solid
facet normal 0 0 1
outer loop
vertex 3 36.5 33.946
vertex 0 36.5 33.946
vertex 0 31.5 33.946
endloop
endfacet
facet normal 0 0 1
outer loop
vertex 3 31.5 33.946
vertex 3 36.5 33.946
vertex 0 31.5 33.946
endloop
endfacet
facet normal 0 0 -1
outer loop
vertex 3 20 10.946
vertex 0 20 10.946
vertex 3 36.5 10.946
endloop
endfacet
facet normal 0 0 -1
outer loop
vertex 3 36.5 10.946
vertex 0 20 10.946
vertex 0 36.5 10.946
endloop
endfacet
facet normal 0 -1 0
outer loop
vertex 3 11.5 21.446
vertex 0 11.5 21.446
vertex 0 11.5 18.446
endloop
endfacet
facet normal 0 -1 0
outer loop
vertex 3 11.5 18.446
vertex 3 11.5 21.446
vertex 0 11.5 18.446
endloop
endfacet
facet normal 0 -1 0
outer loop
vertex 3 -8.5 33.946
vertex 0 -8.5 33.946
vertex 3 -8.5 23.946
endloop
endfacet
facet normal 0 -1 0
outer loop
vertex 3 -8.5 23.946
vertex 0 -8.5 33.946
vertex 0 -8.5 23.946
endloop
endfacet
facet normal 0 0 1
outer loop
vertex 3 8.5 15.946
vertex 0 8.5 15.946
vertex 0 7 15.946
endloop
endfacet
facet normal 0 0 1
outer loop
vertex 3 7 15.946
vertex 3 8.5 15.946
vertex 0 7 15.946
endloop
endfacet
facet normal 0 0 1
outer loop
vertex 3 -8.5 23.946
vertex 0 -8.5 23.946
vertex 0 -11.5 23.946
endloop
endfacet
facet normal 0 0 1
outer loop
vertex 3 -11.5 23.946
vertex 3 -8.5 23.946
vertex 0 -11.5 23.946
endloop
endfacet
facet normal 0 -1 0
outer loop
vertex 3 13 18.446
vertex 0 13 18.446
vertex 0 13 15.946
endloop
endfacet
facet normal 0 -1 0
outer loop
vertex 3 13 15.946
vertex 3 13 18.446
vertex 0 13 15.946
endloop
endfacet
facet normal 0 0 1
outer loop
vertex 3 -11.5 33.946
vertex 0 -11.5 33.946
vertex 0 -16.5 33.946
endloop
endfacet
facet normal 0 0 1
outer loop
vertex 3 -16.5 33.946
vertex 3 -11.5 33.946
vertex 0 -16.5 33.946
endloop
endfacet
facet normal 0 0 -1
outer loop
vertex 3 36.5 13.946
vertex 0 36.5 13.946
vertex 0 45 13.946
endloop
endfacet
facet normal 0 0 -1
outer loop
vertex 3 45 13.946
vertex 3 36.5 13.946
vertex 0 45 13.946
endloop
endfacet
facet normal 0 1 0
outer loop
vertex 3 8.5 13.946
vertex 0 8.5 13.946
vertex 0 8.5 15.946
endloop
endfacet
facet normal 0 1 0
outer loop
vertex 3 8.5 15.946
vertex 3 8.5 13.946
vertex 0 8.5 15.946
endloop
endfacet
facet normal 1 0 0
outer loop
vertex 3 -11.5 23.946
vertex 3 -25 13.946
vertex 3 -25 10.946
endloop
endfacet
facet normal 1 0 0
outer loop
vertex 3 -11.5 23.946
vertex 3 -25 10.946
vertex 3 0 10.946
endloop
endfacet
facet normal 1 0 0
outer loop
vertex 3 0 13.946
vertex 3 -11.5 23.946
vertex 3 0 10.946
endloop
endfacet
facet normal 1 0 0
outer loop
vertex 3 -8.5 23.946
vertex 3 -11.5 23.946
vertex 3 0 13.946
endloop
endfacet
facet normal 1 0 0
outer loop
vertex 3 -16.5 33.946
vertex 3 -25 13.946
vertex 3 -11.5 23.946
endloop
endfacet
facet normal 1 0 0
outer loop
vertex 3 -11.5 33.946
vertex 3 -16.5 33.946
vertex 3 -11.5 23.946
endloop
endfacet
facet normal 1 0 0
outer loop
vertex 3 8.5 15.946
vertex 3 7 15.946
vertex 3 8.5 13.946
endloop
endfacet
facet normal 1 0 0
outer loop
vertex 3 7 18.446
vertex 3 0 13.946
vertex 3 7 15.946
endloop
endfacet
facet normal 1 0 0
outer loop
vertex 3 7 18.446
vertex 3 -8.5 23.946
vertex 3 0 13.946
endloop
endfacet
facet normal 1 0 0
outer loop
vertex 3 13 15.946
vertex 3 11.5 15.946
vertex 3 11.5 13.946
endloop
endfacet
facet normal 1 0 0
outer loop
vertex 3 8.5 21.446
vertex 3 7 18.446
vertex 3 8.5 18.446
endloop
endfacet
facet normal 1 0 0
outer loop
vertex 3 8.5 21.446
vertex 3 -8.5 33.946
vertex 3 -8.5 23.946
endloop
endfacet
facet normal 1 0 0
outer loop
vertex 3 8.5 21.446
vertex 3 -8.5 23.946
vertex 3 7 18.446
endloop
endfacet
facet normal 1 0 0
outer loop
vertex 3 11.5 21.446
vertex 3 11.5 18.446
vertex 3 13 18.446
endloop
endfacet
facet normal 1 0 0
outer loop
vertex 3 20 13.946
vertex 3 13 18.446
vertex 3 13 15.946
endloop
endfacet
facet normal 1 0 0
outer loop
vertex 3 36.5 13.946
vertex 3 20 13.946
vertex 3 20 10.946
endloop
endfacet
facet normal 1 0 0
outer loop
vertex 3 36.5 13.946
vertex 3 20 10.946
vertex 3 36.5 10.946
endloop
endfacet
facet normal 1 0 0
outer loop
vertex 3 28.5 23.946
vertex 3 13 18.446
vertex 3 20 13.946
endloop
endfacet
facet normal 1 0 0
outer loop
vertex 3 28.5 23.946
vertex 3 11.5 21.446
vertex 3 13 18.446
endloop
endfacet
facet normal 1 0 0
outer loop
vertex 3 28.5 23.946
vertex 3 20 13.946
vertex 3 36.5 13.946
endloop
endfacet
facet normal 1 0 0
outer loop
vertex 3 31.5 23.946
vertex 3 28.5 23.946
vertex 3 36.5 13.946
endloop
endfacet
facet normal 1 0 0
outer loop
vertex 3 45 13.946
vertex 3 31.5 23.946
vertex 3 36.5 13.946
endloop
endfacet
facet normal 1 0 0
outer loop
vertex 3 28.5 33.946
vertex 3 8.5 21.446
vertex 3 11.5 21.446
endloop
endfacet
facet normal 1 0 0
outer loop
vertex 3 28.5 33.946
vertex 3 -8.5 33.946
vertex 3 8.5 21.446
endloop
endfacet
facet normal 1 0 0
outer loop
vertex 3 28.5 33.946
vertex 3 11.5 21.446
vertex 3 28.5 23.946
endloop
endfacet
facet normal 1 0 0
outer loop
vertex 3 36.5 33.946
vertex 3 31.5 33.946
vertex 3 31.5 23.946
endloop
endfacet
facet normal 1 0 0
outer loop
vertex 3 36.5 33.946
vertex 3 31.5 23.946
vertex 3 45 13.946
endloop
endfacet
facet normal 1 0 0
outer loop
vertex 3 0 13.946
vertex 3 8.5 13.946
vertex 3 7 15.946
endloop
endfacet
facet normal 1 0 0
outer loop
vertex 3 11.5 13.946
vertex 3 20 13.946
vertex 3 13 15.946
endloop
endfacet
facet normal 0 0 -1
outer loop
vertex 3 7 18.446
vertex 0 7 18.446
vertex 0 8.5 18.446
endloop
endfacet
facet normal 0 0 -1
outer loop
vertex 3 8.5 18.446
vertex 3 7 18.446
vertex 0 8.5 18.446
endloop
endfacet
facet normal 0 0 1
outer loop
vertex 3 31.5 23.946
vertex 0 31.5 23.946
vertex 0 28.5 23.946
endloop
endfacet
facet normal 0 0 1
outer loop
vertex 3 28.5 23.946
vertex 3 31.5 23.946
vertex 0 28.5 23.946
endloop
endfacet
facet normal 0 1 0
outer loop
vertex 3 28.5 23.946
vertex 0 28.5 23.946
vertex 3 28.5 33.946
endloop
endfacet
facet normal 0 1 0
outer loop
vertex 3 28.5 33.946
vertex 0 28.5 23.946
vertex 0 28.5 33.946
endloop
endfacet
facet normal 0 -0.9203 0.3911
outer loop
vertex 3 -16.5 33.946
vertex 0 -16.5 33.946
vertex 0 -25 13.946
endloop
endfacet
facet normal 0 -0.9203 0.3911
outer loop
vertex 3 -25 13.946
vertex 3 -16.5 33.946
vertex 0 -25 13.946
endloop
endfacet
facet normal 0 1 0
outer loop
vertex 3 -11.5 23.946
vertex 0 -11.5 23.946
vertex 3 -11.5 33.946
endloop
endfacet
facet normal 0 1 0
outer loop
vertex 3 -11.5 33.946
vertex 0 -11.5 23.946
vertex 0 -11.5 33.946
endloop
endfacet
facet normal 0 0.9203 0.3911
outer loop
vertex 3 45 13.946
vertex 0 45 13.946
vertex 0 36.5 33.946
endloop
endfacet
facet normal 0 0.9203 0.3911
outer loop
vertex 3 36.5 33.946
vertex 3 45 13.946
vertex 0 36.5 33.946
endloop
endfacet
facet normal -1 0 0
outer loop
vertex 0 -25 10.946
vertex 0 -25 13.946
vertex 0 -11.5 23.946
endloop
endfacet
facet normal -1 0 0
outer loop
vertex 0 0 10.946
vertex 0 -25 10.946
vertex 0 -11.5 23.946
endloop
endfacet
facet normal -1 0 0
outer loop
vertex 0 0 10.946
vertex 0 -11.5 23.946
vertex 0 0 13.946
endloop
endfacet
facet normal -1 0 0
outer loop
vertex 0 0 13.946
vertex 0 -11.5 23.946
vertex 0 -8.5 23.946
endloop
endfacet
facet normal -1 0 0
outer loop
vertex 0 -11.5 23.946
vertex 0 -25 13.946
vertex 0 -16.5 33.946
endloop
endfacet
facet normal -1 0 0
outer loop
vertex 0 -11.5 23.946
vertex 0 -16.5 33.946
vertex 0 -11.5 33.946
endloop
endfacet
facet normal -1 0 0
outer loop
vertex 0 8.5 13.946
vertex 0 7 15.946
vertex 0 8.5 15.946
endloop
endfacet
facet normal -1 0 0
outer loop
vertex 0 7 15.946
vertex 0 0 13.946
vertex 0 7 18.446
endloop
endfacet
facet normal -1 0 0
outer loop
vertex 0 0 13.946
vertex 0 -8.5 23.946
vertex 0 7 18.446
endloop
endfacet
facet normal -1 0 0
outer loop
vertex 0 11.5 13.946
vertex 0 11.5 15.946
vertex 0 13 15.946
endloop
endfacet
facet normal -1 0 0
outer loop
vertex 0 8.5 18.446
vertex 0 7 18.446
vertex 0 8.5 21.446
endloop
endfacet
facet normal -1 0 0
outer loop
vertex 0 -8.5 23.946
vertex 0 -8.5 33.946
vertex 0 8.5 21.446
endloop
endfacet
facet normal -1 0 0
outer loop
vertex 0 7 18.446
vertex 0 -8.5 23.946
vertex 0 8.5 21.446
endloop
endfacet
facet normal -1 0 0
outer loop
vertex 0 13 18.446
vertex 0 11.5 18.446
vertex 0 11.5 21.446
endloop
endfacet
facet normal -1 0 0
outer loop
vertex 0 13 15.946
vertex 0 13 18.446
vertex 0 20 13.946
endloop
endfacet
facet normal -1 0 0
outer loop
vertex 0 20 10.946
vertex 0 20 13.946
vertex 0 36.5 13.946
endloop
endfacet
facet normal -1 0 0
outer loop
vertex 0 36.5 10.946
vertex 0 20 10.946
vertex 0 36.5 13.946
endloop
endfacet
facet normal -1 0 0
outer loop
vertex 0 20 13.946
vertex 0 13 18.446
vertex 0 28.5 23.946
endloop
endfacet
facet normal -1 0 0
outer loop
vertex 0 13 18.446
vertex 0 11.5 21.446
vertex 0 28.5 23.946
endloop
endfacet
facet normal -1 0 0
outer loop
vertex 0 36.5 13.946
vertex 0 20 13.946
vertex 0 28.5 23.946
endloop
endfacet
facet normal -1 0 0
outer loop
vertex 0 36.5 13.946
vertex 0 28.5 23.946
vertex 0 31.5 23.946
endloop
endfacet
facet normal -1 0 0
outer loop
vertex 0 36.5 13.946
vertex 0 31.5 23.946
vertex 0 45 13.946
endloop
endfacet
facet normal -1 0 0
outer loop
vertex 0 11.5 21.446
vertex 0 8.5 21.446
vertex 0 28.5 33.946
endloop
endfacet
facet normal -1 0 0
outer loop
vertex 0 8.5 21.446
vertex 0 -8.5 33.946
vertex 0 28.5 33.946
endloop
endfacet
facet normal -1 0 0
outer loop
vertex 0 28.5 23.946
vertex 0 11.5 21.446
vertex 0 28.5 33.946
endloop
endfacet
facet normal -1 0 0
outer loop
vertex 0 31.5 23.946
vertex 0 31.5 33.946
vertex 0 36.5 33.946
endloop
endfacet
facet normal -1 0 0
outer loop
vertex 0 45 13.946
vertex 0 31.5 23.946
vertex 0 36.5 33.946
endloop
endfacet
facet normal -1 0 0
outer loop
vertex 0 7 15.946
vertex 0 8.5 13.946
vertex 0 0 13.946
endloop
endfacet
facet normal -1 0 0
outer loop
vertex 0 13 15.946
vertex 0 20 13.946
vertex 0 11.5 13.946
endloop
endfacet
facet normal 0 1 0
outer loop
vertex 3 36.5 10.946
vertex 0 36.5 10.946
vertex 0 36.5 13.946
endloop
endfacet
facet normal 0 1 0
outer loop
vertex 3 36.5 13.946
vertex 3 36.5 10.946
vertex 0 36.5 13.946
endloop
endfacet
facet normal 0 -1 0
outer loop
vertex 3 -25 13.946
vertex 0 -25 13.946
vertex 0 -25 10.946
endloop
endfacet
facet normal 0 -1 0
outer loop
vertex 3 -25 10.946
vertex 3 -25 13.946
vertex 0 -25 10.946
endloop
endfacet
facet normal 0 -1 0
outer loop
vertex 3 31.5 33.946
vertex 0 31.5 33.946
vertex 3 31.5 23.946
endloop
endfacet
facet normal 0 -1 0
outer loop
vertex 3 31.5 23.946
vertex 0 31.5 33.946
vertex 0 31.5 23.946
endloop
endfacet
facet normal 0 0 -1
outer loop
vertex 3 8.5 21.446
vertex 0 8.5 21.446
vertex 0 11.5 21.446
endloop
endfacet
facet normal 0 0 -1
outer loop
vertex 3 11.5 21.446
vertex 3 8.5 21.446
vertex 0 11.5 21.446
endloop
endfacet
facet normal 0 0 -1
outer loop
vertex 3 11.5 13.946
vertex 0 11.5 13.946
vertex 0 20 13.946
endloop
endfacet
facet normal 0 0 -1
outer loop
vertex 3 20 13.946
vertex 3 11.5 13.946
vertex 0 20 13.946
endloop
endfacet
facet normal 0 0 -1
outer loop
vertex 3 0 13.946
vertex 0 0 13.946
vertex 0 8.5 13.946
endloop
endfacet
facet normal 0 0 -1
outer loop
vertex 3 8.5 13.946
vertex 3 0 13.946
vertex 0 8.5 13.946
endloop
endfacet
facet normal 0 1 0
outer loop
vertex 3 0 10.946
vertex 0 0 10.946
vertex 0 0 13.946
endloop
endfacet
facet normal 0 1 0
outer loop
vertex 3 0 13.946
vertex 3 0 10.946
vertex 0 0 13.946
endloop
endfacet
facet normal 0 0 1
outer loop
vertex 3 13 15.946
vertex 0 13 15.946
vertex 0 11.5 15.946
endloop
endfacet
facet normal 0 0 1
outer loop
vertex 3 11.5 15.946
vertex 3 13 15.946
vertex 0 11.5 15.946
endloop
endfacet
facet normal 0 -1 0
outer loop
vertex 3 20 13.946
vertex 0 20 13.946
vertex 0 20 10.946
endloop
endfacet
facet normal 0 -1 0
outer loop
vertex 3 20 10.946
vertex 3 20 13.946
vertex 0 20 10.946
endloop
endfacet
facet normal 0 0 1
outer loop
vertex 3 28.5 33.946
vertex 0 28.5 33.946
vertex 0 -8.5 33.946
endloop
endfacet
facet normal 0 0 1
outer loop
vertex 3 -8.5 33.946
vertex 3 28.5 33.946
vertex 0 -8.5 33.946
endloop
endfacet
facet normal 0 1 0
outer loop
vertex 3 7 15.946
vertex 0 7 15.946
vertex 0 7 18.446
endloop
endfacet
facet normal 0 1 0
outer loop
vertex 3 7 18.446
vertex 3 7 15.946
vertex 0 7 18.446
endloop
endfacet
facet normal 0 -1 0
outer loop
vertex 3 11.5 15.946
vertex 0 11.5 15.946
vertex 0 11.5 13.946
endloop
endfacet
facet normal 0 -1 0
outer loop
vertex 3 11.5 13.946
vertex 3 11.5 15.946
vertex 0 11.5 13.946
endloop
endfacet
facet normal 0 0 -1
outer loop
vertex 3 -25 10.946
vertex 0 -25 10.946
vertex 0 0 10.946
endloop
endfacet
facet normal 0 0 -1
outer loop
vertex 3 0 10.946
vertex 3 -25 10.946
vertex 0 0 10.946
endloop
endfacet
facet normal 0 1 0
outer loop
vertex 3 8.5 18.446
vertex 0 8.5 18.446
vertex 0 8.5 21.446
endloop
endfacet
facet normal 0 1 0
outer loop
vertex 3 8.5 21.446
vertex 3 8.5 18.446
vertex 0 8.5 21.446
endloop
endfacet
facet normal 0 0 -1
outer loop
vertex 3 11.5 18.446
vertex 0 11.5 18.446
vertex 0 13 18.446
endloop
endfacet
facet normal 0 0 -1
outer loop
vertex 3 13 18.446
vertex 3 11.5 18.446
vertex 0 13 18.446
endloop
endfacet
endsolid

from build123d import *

# Parameters (mm, degrees)
F1_DEPTH = 3


with BuildPart() as f1:
    # F0 (on Right) → F1 (new body)
    with BuildSketch(Plane.YZ):
        Polygon((-11.5, 23.945743), (-11.5, 33.945743), (-16.5, 33.945743), (-25, 13.945743), (-25, 10.945743), (0, 10.945743), (0, 13.945743), (8.5, 13.945743), (8.5, 15.945743), (7, 15.945743), (7, 18.445743), (8.5, 18.445743), (8.5, 21.445743), (11.5, 21.445743), (11.5, 18.445743), (13, 18.445743), (13, 15.945743), (11.5, 15.945743), (11.5, 13.945743), (20, 13.945743), (20, 10.945743), (36.5, 10.945743), (36.5, 13.945743), (45, 13.945743), (36.5, 33.945743), (31.5, 33.945743), (31.5, 23.945743), (28.5, 23.945743), (28.5, 33.945743), (-8.5, 33.945743), (-8.5, 23.945743), align=None)
    extrude(amount=F1_DEPTH)


solid = f1.part
